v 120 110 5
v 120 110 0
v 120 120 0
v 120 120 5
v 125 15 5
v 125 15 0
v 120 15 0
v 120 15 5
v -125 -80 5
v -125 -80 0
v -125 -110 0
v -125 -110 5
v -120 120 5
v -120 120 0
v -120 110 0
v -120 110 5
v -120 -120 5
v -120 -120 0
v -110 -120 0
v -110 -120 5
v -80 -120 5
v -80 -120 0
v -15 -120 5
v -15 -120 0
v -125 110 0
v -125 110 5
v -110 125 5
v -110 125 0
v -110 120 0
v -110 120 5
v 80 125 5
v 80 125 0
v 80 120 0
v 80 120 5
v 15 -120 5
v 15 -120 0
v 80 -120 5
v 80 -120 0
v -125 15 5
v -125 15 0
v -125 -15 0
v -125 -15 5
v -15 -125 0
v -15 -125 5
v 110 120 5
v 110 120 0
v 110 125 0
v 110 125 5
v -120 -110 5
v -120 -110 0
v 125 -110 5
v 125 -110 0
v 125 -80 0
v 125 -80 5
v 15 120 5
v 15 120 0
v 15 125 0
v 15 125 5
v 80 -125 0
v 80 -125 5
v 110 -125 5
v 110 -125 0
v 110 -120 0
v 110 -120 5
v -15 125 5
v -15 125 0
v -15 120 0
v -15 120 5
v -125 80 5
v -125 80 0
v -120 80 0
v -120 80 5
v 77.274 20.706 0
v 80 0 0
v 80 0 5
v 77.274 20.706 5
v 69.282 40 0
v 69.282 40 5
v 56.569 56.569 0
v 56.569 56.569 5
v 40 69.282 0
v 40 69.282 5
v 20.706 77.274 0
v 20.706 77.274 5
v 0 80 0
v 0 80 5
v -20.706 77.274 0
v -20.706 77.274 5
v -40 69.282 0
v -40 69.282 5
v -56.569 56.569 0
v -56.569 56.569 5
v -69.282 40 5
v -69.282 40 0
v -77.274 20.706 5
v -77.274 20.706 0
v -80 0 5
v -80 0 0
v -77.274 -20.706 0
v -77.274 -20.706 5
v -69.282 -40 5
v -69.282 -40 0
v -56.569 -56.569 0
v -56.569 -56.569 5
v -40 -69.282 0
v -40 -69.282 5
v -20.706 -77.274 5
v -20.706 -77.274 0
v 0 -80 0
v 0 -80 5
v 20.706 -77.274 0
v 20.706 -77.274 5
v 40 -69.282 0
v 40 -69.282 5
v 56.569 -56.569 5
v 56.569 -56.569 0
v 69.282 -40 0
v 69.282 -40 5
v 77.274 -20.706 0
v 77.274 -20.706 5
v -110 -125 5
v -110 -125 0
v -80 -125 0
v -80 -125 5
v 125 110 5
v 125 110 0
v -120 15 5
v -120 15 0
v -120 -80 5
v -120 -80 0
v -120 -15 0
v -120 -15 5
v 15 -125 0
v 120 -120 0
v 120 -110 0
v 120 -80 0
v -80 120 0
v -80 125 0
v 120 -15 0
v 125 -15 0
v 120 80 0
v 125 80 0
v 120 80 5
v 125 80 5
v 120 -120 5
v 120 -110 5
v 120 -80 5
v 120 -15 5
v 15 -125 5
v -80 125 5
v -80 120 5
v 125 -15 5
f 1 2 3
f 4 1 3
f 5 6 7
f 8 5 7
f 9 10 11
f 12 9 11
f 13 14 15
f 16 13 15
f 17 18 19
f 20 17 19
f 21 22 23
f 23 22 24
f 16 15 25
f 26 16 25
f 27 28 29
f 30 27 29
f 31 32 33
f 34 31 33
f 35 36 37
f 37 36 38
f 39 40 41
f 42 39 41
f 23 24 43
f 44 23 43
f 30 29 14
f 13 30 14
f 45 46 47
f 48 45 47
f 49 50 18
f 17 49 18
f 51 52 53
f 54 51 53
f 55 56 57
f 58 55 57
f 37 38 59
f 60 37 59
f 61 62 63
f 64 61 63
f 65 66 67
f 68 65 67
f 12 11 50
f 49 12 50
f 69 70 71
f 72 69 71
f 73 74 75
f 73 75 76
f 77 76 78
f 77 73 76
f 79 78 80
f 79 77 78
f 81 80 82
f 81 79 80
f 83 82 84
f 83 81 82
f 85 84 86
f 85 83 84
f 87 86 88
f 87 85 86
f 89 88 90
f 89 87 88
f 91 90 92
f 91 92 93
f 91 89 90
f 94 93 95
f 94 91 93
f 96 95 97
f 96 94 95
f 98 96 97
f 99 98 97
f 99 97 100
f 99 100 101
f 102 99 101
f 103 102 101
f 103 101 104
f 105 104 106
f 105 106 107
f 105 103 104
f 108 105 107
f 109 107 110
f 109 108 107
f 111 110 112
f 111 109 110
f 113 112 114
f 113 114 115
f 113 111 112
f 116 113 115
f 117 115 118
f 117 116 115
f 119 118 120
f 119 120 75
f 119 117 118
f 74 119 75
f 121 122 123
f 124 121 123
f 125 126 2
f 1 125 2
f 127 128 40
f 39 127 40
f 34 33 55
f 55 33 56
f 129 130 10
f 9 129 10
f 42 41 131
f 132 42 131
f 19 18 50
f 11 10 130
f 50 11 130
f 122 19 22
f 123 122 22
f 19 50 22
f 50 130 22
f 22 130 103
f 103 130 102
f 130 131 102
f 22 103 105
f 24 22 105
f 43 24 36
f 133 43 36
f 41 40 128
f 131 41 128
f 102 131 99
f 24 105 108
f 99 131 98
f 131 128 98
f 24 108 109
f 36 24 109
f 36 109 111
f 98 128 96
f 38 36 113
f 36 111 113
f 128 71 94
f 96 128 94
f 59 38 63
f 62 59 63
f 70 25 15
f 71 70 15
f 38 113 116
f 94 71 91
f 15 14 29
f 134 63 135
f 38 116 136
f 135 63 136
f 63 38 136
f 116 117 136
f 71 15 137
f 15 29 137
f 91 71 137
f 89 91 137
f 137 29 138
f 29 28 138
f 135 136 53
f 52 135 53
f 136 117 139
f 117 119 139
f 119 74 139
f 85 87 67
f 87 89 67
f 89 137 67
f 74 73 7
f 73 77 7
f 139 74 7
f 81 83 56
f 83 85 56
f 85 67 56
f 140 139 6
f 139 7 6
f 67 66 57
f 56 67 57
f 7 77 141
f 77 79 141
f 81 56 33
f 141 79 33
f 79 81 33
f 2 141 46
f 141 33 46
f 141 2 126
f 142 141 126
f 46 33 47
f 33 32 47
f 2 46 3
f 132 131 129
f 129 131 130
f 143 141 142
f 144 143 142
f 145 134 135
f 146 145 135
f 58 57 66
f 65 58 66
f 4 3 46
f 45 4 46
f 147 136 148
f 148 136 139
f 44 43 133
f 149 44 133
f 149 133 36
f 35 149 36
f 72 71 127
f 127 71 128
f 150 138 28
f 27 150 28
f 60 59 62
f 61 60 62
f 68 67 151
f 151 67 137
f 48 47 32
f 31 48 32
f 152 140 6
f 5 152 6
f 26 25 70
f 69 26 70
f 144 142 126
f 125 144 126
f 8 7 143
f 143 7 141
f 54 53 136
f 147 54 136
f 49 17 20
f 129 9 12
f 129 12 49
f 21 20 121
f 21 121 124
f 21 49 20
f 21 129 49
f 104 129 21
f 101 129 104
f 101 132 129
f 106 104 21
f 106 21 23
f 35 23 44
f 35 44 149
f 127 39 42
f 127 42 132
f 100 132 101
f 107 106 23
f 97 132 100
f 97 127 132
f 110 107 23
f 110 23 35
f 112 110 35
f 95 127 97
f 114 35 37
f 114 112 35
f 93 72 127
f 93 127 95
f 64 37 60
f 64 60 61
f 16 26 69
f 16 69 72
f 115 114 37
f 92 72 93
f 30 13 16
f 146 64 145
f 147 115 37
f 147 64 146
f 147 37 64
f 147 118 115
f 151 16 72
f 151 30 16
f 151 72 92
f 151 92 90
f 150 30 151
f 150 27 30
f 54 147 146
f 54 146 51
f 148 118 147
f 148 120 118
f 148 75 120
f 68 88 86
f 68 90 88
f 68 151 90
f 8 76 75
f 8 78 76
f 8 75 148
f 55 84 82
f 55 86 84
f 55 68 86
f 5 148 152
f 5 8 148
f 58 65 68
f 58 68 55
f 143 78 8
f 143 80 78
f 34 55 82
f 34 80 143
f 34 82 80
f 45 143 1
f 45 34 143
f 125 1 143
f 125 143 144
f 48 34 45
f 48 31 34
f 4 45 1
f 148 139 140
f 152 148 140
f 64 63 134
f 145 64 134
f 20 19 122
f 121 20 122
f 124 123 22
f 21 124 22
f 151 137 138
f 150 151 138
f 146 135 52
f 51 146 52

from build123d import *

# Parameters (mm, degrees)
SKETCH1_R           = 80
BOSS_EXTRUDE1_DEPTH = 5


with BuildPart() as part:
    # Sketch1 → Boss-Extrude1 (new body)
    with BuildSketch(Plane.XY):
        Polygon((-110, 120), (-120, 120), (-120, 110), (-125, 110), (-125, 80), (-120, 80), (-120, 15), (-125, 15), (-125, -15), (-120, -15), (-120, -80), (-125, -80), (-125, -110), (-120, -110), (-120, -120), (-110, -120), (-110, -125), (-80, -125), (-80, -120), (-15, -120), (-15, -125), (15, -125), (15, -120), (80, -120), (80, -125), (110, -125), (110, -120), (120, -120), (120, -110), (125, -110), (125, -80), (120, -80), (120, -15), (125, -15), (125, 15), (120, 15), (120, 80), (125, 80), (125, 110), (120, 110), (120, 120), (110, 120), (110, 125), (80, 125), (80, 120), (15, 120), (15, 125), (-15, 125), (-15, 120), (-80, 120), (-80, 125), (-110, 125), align=None)
        Circle(SKETCH1_R, mode=Mode.SUBTRACT)
    extrude(amount=BOSS_EXTRUDE1_DEPTH)


solid = part.part
